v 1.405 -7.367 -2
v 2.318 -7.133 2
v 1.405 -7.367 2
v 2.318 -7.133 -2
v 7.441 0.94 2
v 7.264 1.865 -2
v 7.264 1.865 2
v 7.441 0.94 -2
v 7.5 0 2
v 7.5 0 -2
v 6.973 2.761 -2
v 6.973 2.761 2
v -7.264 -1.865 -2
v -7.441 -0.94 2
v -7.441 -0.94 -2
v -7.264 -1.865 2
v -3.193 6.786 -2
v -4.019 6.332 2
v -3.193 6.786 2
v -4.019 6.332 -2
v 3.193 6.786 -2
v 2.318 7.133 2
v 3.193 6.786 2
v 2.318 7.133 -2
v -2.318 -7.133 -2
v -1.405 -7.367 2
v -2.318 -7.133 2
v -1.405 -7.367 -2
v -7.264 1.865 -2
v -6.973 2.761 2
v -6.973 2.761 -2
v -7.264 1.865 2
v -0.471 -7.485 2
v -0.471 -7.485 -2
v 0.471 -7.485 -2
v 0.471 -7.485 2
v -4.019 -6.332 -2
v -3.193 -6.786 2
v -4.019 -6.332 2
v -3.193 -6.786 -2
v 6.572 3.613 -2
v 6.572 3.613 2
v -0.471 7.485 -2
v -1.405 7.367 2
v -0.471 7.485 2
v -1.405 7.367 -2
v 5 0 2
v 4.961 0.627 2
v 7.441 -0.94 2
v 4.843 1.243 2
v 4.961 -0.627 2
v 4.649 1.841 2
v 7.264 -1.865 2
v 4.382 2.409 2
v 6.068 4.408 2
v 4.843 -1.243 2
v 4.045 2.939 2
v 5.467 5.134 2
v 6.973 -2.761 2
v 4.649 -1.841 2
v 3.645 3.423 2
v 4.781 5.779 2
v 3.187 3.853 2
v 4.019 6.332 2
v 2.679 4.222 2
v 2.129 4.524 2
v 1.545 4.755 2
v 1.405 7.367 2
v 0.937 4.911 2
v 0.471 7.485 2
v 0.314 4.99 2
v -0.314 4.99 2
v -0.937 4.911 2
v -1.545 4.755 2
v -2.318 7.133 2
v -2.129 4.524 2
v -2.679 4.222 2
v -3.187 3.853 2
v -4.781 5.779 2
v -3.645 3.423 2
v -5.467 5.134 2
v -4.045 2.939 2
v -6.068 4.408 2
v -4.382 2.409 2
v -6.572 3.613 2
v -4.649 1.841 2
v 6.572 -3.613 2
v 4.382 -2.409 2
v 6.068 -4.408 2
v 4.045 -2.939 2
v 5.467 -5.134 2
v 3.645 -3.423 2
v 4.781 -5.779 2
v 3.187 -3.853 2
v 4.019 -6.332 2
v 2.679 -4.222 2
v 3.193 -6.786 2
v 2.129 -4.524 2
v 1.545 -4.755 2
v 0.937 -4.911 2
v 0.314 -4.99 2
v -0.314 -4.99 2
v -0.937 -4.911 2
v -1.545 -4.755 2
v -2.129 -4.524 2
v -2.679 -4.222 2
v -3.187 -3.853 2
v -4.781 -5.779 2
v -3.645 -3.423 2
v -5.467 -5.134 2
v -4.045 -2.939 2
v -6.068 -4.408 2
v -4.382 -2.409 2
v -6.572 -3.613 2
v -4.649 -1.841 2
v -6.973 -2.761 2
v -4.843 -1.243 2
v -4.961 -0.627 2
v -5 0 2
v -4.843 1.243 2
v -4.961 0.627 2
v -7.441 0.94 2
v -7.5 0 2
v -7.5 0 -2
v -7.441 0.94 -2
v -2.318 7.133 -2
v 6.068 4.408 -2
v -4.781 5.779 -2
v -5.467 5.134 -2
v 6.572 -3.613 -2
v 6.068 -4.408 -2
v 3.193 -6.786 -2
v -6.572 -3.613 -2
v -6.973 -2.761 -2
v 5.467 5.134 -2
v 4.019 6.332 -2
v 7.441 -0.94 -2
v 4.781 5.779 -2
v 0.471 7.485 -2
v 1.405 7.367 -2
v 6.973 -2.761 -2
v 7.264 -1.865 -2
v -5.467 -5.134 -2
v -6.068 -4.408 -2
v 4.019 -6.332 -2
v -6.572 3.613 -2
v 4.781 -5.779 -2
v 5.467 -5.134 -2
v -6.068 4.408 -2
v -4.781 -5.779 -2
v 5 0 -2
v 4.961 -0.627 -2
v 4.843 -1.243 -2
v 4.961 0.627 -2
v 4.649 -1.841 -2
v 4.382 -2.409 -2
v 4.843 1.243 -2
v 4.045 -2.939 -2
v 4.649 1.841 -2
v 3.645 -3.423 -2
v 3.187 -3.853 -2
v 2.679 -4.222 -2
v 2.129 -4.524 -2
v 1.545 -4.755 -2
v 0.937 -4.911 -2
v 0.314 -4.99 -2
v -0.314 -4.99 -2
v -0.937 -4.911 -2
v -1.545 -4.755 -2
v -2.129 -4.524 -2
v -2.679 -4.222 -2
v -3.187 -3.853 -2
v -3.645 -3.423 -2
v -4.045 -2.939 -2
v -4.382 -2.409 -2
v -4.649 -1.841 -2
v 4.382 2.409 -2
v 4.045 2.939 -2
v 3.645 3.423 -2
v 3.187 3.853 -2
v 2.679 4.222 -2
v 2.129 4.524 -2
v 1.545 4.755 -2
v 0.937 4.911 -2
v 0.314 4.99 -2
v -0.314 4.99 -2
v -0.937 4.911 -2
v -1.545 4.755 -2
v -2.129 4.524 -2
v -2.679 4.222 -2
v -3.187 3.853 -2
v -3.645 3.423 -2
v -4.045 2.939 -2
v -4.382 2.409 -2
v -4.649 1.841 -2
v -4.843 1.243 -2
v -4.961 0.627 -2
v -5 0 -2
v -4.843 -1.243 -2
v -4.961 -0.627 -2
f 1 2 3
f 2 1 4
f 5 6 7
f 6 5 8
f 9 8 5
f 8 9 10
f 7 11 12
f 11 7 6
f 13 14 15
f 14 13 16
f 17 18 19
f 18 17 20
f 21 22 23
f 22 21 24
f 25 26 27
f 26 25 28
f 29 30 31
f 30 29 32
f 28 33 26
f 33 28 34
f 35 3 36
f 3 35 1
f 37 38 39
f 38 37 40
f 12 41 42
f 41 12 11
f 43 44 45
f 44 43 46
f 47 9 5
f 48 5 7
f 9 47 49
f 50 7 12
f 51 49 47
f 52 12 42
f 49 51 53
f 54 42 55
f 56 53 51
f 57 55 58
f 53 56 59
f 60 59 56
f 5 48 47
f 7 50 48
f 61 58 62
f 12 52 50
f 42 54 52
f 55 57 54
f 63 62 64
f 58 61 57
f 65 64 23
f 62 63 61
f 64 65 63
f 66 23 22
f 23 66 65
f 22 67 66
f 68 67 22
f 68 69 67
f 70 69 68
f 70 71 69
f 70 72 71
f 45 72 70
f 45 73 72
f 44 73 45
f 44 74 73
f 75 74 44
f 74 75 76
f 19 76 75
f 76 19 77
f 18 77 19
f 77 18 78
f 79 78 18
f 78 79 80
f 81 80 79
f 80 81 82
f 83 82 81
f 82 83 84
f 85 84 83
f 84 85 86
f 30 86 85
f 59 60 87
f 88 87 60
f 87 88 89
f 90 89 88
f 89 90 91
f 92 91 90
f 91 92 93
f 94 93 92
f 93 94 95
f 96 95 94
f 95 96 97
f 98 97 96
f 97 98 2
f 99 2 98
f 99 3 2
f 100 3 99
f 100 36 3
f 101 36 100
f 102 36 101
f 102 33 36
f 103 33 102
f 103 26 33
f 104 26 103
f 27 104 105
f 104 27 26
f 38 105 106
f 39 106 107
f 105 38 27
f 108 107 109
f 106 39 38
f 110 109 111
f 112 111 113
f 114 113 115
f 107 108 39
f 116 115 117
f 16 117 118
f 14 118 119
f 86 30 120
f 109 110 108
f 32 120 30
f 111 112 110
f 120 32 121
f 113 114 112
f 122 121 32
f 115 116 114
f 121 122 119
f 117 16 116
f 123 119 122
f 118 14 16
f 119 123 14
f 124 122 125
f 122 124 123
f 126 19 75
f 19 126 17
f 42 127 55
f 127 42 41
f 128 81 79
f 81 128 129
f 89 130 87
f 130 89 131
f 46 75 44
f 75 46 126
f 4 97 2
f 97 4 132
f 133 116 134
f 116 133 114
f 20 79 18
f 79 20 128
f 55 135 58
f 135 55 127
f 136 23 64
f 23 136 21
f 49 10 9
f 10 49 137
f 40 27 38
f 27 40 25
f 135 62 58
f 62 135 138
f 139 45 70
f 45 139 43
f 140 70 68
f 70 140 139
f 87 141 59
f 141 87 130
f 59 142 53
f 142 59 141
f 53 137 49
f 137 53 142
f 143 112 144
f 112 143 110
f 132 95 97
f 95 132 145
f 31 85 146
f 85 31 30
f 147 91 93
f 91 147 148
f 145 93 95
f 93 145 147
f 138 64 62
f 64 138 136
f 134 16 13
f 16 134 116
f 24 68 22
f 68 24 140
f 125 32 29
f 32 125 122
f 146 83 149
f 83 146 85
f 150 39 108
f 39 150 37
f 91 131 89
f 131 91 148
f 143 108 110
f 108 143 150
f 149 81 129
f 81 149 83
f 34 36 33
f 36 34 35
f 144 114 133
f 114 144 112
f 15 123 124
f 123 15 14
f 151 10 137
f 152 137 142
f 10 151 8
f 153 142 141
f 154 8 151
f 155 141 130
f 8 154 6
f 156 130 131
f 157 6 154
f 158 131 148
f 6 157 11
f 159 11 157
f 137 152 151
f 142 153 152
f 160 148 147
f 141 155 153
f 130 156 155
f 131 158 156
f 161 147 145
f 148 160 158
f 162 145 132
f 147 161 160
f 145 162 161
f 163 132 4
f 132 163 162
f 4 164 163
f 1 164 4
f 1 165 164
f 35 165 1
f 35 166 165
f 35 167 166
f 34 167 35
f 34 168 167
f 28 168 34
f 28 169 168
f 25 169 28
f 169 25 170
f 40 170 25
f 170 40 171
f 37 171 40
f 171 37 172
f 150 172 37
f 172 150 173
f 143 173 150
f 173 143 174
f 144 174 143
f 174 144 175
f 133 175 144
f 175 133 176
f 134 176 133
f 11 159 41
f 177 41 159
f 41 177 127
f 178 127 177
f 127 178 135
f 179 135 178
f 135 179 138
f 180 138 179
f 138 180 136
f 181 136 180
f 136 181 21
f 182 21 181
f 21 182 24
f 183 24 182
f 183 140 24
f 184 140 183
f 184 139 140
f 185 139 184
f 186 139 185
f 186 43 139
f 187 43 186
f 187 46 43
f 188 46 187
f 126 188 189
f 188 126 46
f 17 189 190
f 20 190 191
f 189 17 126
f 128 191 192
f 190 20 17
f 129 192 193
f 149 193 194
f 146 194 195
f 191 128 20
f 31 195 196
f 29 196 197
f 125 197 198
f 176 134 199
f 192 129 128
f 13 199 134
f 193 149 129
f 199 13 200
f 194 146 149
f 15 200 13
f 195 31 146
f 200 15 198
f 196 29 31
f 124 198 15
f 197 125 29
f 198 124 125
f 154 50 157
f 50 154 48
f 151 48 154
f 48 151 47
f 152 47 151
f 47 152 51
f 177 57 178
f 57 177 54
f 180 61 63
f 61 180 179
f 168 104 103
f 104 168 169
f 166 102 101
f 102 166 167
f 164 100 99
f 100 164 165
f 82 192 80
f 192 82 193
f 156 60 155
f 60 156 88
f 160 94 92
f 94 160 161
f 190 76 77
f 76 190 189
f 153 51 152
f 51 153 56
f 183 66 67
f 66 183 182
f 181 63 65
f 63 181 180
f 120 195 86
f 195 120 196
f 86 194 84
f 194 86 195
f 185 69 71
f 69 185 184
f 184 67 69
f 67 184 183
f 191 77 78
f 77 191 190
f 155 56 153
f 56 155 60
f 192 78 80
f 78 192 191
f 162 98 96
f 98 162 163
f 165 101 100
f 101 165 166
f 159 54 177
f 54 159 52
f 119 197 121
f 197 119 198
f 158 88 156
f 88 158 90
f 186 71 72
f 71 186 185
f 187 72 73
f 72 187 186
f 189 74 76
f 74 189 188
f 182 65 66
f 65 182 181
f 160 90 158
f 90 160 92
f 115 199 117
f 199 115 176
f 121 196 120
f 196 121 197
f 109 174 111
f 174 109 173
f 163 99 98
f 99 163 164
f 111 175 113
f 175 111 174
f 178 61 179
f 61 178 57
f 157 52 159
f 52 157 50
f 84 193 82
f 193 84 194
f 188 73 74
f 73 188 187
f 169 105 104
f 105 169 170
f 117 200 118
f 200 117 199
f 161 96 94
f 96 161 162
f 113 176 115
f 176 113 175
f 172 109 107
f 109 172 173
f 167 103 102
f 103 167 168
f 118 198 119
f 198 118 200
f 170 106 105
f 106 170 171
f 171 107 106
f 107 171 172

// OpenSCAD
$fn = 50;


difference() {
	union() {
		translate(v = [0, 0, -2.0000000000]) {
			cylinder(h = 4, r = 7.5000000000);
		}
	}
	union() {
		translate(v = [0, 0, -100.0000000000]) {
			cylinder(h = 200, r = 5.0000000000);
		}
	}
}
